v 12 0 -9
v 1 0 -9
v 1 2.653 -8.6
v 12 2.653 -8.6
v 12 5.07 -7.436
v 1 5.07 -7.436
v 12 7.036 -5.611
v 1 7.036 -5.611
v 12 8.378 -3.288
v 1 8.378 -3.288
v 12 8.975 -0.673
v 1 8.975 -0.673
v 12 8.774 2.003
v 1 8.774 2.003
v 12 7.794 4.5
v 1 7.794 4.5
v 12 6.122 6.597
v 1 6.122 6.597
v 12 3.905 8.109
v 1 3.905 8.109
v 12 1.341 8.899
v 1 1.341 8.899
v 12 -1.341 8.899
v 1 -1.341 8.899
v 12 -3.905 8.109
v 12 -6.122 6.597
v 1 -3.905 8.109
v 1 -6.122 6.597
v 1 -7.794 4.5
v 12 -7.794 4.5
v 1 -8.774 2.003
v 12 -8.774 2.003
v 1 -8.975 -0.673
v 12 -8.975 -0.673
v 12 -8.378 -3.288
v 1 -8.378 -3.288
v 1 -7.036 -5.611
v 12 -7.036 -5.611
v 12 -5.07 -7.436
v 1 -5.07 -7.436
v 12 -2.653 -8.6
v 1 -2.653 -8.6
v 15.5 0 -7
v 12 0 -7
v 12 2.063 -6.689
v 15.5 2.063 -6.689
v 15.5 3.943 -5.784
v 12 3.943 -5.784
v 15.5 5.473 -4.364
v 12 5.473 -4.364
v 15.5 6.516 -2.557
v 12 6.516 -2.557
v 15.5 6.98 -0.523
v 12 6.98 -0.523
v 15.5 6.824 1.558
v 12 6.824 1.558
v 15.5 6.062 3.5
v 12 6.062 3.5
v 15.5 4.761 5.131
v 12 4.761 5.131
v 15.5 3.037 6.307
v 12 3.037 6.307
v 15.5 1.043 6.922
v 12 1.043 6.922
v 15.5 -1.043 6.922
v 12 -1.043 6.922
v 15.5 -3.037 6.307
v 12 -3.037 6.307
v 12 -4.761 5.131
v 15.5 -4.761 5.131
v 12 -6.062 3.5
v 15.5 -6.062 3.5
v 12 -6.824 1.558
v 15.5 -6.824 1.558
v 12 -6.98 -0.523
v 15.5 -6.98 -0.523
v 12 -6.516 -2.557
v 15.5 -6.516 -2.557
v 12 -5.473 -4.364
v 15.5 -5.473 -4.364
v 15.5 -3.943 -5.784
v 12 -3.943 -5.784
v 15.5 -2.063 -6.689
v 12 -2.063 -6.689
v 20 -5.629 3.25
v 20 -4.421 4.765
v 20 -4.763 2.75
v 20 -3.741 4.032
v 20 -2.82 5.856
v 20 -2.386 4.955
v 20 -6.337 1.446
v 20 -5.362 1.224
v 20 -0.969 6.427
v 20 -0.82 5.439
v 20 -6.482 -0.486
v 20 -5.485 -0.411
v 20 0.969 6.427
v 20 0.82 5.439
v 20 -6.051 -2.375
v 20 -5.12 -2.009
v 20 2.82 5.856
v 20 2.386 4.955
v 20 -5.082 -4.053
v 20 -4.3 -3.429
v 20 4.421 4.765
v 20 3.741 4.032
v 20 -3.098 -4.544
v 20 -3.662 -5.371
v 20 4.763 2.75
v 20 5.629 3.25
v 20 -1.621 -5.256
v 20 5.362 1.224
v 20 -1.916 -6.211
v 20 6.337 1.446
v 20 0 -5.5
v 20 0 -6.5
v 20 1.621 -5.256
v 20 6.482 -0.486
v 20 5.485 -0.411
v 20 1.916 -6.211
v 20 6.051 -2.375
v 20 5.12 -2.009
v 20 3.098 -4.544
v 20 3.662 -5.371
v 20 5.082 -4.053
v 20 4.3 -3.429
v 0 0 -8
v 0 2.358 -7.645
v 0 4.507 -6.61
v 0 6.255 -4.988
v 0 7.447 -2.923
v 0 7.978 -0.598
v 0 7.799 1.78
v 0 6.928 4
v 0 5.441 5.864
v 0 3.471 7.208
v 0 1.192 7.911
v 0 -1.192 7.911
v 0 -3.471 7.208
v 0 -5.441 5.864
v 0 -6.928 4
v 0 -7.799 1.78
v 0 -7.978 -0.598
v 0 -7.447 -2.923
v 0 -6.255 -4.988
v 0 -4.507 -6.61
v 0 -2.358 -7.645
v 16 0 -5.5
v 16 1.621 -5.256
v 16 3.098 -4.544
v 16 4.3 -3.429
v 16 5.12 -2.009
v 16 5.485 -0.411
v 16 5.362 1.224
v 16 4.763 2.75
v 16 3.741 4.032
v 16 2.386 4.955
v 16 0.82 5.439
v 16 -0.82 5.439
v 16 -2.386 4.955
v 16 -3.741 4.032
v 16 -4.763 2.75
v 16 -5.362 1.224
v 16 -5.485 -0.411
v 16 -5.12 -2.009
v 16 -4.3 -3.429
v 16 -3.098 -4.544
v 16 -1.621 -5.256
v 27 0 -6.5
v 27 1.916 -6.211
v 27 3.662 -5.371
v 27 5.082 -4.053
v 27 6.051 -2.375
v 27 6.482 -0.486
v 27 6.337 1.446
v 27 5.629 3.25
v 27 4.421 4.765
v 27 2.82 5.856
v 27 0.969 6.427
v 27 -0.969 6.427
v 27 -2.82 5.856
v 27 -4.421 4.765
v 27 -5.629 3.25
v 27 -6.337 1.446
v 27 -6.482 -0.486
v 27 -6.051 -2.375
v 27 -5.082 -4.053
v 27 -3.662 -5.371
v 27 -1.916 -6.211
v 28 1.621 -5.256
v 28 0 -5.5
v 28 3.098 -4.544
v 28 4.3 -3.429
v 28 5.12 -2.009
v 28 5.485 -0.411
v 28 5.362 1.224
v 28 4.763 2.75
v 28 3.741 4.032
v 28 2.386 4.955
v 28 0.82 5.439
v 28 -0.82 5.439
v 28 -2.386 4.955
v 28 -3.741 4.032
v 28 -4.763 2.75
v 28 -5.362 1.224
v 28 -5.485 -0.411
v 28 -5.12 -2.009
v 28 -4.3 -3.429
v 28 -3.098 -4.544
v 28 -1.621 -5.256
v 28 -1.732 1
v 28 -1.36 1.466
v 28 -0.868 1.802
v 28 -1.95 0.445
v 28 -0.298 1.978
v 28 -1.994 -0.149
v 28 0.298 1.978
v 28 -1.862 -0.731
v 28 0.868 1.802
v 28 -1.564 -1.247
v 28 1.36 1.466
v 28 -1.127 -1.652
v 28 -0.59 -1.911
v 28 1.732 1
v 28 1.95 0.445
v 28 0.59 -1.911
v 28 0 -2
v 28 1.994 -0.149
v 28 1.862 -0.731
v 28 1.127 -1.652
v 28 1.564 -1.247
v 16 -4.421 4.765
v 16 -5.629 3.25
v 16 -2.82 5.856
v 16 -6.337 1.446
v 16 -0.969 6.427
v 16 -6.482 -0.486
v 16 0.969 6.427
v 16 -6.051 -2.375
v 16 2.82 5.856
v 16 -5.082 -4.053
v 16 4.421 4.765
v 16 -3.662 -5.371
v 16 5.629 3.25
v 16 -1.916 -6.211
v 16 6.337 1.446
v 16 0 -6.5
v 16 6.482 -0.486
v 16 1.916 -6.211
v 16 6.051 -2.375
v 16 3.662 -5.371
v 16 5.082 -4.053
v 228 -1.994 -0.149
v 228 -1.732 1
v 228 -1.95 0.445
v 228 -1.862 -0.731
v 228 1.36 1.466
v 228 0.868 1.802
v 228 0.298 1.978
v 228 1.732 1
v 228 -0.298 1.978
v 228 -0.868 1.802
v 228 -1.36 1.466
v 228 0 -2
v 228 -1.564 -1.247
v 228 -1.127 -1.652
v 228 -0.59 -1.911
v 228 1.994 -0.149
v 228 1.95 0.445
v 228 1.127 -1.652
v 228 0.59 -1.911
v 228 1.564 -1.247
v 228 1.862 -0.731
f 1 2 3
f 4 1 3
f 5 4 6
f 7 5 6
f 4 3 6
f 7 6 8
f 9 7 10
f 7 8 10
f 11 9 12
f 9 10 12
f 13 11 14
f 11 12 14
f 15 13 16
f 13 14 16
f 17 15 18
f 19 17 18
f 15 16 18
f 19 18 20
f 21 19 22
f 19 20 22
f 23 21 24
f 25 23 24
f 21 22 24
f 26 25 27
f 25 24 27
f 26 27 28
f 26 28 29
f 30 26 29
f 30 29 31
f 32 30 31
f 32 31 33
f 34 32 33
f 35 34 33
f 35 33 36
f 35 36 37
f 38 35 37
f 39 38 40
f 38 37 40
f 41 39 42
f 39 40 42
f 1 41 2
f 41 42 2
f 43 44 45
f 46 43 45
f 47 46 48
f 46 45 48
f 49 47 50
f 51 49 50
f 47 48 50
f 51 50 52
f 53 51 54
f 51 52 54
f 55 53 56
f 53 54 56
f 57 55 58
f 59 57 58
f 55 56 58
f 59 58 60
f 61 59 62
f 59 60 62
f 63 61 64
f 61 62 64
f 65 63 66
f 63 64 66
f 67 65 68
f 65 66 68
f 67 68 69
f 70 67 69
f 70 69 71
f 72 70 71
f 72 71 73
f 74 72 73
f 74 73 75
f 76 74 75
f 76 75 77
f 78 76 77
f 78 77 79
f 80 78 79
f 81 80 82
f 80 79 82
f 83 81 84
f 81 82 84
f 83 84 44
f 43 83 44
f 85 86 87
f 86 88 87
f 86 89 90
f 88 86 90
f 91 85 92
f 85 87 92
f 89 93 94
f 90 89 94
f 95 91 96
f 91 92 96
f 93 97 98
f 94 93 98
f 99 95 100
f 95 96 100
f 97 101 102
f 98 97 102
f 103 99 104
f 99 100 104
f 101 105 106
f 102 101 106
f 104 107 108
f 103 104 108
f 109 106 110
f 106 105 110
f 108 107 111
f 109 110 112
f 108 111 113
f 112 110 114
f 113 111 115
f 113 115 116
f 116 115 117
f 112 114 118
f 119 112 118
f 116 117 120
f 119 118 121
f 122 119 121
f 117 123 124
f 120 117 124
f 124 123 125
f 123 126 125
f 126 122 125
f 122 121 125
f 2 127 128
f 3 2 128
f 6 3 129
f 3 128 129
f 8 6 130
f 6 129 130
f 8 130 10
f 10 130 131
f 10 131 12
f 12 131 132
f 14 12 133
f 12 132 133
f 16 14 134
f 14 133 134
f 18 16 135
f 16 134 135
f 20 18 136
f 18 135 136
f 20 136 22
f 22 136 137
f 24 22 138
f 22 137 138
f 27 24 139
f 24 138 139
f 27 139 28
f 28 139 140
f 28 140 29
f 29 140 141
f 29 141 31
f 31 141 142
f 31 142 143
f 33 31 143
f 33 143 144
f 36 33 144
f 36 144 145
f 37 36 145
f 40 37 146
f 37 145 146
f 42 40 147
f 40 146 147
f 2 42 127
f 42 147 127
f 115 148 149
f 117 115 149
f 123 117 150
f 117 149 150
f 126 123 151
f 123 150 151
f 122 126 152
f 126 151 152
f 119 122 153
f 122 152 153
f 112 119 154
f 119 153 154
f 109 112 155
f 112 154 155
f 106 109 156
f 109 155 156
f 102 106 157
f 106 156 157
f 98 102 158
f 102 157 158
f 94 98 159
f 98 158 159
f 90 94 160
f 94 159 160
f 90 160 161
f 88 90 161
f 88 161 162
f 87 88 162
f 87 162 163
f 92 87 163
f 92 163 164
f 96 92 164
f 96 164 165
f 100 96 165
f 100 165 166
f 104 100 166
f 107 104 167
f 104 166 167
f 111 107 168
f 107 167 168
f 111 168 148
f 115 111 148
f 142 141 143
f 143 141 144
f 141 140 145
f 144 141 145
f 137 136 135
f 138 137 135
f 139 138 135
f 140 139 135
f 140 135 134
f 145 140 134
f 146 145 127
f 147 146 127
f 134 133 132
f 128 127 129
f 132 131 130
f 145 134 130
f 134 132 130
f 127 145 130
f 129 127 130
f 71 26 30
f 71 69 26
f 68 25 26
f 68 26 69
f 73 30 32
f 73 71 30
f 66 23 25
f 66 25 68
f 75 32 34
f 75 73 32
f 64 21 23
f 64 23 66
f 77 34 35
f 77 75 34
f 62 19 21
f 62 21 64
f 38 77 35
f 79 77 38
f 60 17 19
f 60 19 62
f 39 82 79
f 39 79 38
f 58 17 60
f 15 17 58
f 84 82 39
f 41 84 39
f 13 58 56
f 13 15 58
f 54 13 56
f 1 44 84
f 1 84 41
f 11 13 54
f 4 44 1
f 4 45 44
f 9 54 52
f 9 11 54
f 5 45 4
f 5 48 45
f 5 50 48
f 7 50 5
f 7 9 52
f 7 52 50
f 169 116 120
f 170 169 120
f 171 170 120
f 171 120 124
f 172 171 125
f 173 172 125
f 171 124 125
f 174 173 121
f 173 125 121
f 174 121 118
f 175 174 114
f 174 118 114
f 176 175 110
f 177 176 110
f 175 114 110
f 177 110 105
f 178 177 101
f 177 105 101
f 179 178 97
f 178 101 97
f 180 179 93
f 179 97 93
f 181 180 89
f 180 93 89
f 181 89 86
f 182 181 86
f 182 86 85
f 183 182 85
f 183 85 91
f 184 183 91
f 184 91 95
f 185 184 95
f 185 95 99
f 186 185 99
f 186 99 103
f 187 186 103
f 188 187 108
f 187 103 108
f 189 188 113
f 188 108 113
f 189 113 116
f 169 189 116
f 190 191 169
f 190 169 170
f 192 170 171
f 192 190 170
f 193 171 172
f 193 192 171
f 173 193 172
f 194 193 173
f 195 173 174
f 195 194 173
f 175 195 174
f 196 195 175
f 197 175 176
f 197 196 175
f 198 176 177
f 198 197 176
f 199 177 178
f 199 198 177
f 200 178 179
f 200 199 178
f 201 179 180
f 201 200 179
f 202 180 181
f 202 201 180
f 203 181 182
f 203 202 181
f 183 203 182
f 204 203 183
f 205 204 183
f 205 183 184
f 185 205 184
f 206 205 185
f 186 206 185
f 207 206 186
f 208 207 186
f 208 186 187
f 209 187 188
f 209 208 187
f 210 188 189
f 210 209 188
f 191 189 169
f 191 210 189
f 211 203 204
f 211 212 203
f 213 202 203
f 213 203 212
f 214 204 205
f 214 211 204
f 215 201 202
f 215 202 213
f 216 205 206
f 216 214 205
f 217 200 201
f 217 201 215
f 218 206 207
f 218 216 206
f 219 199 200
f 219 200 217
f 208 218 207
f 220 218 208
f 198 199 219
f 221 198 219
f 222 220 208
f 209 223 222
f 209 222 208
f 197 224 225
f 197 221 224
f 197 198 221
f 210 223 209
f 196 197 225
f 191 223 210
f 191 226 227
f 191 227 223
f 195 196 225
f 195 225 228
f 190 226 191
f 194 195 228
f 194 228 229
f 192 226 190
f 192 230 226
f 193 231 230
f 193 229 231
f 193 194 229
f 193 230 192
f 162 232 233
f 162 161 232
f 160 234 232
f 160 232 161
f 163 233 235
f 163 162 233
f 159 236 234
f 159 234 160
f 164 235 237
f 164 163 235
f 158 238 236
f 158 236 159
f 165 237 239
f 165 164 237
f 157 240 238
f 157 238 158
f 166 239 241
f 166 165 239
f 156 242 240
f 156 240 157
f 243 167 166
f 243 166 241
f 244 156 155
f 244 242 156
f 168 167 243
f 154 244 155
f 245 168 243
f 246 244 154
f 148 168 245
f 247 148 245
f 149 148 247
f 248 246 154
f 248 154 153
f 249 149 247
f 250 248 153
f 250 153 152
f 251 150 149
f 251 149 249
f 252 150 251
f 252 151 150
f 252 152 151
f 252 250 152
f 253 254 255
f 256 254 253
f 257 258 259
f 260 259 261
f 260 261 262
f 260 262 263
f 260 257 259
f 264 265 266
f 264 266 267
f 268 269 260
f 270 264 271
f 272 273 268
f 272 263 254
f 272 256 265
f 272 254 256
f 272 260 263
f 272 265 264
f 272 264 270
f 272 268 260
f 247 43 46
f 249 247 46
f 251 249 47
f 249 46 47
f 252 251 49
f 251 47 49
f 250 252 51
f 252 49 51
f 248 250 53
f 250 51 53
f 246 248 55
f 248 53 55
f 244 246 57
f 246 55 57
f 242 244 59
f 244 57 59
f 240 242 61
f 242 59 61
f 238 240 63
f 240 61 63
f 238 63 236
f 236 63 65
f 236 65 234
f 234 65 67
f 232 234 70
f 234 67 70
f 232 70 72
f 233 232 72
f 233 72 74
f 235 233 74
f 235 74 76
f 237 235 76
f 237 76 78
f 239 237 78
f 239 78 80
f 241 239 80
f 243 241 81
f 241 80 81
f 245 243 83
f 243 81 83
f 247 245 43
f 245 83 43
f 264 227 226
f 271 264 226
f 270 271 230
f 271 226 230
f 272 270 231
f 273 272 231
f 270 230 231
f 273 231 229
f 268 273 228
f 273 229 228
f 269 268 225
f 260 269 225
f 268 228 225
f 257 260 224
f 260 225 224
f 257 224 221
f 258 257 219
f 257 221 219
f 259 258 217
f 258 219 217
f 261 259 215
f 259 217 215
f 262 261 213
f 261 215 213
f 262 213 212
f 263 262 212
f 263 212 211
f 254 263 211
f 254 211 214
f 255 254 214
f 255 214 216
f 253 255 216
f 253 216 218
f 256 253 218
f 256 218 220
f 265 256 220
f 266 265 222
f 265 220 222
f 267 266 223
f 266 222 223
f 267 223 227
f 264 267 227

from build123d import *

# Parameters (mm, degrees)
CROQUIS1_R              = 9
SALIENTE_EXTRUIR1_DEPTH = 12
CHAFL_N1_SIZE           = 1
CROQUIS2_R              = 7
SALIENTE_EXTRUIR2_DEPTH = 4
CROQUIS3_R              = 5.5
SALIENTE_EXTRUIR3_DEPTH = 4
CROQUIS4_R              = 6.5
SALIENTE_EXTRUIR4_DEPTH = 8
CHAFL_N2_SIZE           = 1
CROQUIS5_R              = 2
SALIENTE_EXTRUIR5_DEPTH = 200
CHAFL_N3_SIZE           = 0.5


with BuildPart() as part:
    # Croquis1 → Saliente-Extruir1 (new body)
    with BuildSketch(Plane(origin=(0, 0, 0), x_dir=(0, 0, -1), z_dir=(1, 0, 0))):
        Circle(CROQUIS1_R)
    extrude(amount=SALIENTE_EXTRUIR1_DEPTH)

    # Chaflán1
    chafl_n1_edges = [part.edges().sort_by_distance(p)[0] for p in [
        (0, 0, 9),
    ]]
    chamfer(chafl_n1_edges, length=CHAFL_N1_SIZE)

    # Croquis2 → Saliente-Extruir2 (add)
    with BuildSketch(Plane(origin=(12, 0, 0), x_dir=(0, 0, -1), z_dir=(1, 0, 0))):
        Circle(CROQUIS2_R)
    extrude(amount=SALIENTE_EXTRUIR2_DEPTH)

    # Croquis3 → Saliente-Extruir3 (add)
    with BuildSketch(Plane(origin=(16, 0, 0), x_dir=(0, 0, -1), z_dir=(1, 0, 0))):
        Circle(CROQUIS3_R)
    extrude(amount=SALIENTE_EXTRUIR3_DEPTH)

    # Croquis4 → Saliente-Extruir4 (add)
    with BuildSketch(Plane(origin=(20, 0, 0), x_dir=(0, 0, -1), z_dir=(1, 0, 0))):
        Circle(CROQUIS4_R)
    extrude(amount=SALIENTE_EXTRUIR4_DEPTH)

    # Chaflán2
    chafl_n2_edges = [part.edges().sort_by_distance(p)[0] for p in [
        (28, 0, 6.5),
    ]]
    chamfer(chafl_n2_edges, length=CHAFL_N2_SIZE)

    # Croquis5 → Saliente-Extruir5 (add)
    with BuildSketch(Plane(origin=(28, 0, 0), x_dir=(0, 0, -1), z_dir=(1, 0, 0))):
        Circle(CROQUIS5_R)
    extrude(amount=SALIENTE_EXTRUIR5_DEPTH)

    # Chaflán3
    chafl_n3_edges = [part.edges().sort_by_distance(p)[0] for p in [
        (16, 0, 7),
    ]]
    chamfer(chafl_n3_edges, length=CHAFL_N3_SIZE)


solid = part.part
